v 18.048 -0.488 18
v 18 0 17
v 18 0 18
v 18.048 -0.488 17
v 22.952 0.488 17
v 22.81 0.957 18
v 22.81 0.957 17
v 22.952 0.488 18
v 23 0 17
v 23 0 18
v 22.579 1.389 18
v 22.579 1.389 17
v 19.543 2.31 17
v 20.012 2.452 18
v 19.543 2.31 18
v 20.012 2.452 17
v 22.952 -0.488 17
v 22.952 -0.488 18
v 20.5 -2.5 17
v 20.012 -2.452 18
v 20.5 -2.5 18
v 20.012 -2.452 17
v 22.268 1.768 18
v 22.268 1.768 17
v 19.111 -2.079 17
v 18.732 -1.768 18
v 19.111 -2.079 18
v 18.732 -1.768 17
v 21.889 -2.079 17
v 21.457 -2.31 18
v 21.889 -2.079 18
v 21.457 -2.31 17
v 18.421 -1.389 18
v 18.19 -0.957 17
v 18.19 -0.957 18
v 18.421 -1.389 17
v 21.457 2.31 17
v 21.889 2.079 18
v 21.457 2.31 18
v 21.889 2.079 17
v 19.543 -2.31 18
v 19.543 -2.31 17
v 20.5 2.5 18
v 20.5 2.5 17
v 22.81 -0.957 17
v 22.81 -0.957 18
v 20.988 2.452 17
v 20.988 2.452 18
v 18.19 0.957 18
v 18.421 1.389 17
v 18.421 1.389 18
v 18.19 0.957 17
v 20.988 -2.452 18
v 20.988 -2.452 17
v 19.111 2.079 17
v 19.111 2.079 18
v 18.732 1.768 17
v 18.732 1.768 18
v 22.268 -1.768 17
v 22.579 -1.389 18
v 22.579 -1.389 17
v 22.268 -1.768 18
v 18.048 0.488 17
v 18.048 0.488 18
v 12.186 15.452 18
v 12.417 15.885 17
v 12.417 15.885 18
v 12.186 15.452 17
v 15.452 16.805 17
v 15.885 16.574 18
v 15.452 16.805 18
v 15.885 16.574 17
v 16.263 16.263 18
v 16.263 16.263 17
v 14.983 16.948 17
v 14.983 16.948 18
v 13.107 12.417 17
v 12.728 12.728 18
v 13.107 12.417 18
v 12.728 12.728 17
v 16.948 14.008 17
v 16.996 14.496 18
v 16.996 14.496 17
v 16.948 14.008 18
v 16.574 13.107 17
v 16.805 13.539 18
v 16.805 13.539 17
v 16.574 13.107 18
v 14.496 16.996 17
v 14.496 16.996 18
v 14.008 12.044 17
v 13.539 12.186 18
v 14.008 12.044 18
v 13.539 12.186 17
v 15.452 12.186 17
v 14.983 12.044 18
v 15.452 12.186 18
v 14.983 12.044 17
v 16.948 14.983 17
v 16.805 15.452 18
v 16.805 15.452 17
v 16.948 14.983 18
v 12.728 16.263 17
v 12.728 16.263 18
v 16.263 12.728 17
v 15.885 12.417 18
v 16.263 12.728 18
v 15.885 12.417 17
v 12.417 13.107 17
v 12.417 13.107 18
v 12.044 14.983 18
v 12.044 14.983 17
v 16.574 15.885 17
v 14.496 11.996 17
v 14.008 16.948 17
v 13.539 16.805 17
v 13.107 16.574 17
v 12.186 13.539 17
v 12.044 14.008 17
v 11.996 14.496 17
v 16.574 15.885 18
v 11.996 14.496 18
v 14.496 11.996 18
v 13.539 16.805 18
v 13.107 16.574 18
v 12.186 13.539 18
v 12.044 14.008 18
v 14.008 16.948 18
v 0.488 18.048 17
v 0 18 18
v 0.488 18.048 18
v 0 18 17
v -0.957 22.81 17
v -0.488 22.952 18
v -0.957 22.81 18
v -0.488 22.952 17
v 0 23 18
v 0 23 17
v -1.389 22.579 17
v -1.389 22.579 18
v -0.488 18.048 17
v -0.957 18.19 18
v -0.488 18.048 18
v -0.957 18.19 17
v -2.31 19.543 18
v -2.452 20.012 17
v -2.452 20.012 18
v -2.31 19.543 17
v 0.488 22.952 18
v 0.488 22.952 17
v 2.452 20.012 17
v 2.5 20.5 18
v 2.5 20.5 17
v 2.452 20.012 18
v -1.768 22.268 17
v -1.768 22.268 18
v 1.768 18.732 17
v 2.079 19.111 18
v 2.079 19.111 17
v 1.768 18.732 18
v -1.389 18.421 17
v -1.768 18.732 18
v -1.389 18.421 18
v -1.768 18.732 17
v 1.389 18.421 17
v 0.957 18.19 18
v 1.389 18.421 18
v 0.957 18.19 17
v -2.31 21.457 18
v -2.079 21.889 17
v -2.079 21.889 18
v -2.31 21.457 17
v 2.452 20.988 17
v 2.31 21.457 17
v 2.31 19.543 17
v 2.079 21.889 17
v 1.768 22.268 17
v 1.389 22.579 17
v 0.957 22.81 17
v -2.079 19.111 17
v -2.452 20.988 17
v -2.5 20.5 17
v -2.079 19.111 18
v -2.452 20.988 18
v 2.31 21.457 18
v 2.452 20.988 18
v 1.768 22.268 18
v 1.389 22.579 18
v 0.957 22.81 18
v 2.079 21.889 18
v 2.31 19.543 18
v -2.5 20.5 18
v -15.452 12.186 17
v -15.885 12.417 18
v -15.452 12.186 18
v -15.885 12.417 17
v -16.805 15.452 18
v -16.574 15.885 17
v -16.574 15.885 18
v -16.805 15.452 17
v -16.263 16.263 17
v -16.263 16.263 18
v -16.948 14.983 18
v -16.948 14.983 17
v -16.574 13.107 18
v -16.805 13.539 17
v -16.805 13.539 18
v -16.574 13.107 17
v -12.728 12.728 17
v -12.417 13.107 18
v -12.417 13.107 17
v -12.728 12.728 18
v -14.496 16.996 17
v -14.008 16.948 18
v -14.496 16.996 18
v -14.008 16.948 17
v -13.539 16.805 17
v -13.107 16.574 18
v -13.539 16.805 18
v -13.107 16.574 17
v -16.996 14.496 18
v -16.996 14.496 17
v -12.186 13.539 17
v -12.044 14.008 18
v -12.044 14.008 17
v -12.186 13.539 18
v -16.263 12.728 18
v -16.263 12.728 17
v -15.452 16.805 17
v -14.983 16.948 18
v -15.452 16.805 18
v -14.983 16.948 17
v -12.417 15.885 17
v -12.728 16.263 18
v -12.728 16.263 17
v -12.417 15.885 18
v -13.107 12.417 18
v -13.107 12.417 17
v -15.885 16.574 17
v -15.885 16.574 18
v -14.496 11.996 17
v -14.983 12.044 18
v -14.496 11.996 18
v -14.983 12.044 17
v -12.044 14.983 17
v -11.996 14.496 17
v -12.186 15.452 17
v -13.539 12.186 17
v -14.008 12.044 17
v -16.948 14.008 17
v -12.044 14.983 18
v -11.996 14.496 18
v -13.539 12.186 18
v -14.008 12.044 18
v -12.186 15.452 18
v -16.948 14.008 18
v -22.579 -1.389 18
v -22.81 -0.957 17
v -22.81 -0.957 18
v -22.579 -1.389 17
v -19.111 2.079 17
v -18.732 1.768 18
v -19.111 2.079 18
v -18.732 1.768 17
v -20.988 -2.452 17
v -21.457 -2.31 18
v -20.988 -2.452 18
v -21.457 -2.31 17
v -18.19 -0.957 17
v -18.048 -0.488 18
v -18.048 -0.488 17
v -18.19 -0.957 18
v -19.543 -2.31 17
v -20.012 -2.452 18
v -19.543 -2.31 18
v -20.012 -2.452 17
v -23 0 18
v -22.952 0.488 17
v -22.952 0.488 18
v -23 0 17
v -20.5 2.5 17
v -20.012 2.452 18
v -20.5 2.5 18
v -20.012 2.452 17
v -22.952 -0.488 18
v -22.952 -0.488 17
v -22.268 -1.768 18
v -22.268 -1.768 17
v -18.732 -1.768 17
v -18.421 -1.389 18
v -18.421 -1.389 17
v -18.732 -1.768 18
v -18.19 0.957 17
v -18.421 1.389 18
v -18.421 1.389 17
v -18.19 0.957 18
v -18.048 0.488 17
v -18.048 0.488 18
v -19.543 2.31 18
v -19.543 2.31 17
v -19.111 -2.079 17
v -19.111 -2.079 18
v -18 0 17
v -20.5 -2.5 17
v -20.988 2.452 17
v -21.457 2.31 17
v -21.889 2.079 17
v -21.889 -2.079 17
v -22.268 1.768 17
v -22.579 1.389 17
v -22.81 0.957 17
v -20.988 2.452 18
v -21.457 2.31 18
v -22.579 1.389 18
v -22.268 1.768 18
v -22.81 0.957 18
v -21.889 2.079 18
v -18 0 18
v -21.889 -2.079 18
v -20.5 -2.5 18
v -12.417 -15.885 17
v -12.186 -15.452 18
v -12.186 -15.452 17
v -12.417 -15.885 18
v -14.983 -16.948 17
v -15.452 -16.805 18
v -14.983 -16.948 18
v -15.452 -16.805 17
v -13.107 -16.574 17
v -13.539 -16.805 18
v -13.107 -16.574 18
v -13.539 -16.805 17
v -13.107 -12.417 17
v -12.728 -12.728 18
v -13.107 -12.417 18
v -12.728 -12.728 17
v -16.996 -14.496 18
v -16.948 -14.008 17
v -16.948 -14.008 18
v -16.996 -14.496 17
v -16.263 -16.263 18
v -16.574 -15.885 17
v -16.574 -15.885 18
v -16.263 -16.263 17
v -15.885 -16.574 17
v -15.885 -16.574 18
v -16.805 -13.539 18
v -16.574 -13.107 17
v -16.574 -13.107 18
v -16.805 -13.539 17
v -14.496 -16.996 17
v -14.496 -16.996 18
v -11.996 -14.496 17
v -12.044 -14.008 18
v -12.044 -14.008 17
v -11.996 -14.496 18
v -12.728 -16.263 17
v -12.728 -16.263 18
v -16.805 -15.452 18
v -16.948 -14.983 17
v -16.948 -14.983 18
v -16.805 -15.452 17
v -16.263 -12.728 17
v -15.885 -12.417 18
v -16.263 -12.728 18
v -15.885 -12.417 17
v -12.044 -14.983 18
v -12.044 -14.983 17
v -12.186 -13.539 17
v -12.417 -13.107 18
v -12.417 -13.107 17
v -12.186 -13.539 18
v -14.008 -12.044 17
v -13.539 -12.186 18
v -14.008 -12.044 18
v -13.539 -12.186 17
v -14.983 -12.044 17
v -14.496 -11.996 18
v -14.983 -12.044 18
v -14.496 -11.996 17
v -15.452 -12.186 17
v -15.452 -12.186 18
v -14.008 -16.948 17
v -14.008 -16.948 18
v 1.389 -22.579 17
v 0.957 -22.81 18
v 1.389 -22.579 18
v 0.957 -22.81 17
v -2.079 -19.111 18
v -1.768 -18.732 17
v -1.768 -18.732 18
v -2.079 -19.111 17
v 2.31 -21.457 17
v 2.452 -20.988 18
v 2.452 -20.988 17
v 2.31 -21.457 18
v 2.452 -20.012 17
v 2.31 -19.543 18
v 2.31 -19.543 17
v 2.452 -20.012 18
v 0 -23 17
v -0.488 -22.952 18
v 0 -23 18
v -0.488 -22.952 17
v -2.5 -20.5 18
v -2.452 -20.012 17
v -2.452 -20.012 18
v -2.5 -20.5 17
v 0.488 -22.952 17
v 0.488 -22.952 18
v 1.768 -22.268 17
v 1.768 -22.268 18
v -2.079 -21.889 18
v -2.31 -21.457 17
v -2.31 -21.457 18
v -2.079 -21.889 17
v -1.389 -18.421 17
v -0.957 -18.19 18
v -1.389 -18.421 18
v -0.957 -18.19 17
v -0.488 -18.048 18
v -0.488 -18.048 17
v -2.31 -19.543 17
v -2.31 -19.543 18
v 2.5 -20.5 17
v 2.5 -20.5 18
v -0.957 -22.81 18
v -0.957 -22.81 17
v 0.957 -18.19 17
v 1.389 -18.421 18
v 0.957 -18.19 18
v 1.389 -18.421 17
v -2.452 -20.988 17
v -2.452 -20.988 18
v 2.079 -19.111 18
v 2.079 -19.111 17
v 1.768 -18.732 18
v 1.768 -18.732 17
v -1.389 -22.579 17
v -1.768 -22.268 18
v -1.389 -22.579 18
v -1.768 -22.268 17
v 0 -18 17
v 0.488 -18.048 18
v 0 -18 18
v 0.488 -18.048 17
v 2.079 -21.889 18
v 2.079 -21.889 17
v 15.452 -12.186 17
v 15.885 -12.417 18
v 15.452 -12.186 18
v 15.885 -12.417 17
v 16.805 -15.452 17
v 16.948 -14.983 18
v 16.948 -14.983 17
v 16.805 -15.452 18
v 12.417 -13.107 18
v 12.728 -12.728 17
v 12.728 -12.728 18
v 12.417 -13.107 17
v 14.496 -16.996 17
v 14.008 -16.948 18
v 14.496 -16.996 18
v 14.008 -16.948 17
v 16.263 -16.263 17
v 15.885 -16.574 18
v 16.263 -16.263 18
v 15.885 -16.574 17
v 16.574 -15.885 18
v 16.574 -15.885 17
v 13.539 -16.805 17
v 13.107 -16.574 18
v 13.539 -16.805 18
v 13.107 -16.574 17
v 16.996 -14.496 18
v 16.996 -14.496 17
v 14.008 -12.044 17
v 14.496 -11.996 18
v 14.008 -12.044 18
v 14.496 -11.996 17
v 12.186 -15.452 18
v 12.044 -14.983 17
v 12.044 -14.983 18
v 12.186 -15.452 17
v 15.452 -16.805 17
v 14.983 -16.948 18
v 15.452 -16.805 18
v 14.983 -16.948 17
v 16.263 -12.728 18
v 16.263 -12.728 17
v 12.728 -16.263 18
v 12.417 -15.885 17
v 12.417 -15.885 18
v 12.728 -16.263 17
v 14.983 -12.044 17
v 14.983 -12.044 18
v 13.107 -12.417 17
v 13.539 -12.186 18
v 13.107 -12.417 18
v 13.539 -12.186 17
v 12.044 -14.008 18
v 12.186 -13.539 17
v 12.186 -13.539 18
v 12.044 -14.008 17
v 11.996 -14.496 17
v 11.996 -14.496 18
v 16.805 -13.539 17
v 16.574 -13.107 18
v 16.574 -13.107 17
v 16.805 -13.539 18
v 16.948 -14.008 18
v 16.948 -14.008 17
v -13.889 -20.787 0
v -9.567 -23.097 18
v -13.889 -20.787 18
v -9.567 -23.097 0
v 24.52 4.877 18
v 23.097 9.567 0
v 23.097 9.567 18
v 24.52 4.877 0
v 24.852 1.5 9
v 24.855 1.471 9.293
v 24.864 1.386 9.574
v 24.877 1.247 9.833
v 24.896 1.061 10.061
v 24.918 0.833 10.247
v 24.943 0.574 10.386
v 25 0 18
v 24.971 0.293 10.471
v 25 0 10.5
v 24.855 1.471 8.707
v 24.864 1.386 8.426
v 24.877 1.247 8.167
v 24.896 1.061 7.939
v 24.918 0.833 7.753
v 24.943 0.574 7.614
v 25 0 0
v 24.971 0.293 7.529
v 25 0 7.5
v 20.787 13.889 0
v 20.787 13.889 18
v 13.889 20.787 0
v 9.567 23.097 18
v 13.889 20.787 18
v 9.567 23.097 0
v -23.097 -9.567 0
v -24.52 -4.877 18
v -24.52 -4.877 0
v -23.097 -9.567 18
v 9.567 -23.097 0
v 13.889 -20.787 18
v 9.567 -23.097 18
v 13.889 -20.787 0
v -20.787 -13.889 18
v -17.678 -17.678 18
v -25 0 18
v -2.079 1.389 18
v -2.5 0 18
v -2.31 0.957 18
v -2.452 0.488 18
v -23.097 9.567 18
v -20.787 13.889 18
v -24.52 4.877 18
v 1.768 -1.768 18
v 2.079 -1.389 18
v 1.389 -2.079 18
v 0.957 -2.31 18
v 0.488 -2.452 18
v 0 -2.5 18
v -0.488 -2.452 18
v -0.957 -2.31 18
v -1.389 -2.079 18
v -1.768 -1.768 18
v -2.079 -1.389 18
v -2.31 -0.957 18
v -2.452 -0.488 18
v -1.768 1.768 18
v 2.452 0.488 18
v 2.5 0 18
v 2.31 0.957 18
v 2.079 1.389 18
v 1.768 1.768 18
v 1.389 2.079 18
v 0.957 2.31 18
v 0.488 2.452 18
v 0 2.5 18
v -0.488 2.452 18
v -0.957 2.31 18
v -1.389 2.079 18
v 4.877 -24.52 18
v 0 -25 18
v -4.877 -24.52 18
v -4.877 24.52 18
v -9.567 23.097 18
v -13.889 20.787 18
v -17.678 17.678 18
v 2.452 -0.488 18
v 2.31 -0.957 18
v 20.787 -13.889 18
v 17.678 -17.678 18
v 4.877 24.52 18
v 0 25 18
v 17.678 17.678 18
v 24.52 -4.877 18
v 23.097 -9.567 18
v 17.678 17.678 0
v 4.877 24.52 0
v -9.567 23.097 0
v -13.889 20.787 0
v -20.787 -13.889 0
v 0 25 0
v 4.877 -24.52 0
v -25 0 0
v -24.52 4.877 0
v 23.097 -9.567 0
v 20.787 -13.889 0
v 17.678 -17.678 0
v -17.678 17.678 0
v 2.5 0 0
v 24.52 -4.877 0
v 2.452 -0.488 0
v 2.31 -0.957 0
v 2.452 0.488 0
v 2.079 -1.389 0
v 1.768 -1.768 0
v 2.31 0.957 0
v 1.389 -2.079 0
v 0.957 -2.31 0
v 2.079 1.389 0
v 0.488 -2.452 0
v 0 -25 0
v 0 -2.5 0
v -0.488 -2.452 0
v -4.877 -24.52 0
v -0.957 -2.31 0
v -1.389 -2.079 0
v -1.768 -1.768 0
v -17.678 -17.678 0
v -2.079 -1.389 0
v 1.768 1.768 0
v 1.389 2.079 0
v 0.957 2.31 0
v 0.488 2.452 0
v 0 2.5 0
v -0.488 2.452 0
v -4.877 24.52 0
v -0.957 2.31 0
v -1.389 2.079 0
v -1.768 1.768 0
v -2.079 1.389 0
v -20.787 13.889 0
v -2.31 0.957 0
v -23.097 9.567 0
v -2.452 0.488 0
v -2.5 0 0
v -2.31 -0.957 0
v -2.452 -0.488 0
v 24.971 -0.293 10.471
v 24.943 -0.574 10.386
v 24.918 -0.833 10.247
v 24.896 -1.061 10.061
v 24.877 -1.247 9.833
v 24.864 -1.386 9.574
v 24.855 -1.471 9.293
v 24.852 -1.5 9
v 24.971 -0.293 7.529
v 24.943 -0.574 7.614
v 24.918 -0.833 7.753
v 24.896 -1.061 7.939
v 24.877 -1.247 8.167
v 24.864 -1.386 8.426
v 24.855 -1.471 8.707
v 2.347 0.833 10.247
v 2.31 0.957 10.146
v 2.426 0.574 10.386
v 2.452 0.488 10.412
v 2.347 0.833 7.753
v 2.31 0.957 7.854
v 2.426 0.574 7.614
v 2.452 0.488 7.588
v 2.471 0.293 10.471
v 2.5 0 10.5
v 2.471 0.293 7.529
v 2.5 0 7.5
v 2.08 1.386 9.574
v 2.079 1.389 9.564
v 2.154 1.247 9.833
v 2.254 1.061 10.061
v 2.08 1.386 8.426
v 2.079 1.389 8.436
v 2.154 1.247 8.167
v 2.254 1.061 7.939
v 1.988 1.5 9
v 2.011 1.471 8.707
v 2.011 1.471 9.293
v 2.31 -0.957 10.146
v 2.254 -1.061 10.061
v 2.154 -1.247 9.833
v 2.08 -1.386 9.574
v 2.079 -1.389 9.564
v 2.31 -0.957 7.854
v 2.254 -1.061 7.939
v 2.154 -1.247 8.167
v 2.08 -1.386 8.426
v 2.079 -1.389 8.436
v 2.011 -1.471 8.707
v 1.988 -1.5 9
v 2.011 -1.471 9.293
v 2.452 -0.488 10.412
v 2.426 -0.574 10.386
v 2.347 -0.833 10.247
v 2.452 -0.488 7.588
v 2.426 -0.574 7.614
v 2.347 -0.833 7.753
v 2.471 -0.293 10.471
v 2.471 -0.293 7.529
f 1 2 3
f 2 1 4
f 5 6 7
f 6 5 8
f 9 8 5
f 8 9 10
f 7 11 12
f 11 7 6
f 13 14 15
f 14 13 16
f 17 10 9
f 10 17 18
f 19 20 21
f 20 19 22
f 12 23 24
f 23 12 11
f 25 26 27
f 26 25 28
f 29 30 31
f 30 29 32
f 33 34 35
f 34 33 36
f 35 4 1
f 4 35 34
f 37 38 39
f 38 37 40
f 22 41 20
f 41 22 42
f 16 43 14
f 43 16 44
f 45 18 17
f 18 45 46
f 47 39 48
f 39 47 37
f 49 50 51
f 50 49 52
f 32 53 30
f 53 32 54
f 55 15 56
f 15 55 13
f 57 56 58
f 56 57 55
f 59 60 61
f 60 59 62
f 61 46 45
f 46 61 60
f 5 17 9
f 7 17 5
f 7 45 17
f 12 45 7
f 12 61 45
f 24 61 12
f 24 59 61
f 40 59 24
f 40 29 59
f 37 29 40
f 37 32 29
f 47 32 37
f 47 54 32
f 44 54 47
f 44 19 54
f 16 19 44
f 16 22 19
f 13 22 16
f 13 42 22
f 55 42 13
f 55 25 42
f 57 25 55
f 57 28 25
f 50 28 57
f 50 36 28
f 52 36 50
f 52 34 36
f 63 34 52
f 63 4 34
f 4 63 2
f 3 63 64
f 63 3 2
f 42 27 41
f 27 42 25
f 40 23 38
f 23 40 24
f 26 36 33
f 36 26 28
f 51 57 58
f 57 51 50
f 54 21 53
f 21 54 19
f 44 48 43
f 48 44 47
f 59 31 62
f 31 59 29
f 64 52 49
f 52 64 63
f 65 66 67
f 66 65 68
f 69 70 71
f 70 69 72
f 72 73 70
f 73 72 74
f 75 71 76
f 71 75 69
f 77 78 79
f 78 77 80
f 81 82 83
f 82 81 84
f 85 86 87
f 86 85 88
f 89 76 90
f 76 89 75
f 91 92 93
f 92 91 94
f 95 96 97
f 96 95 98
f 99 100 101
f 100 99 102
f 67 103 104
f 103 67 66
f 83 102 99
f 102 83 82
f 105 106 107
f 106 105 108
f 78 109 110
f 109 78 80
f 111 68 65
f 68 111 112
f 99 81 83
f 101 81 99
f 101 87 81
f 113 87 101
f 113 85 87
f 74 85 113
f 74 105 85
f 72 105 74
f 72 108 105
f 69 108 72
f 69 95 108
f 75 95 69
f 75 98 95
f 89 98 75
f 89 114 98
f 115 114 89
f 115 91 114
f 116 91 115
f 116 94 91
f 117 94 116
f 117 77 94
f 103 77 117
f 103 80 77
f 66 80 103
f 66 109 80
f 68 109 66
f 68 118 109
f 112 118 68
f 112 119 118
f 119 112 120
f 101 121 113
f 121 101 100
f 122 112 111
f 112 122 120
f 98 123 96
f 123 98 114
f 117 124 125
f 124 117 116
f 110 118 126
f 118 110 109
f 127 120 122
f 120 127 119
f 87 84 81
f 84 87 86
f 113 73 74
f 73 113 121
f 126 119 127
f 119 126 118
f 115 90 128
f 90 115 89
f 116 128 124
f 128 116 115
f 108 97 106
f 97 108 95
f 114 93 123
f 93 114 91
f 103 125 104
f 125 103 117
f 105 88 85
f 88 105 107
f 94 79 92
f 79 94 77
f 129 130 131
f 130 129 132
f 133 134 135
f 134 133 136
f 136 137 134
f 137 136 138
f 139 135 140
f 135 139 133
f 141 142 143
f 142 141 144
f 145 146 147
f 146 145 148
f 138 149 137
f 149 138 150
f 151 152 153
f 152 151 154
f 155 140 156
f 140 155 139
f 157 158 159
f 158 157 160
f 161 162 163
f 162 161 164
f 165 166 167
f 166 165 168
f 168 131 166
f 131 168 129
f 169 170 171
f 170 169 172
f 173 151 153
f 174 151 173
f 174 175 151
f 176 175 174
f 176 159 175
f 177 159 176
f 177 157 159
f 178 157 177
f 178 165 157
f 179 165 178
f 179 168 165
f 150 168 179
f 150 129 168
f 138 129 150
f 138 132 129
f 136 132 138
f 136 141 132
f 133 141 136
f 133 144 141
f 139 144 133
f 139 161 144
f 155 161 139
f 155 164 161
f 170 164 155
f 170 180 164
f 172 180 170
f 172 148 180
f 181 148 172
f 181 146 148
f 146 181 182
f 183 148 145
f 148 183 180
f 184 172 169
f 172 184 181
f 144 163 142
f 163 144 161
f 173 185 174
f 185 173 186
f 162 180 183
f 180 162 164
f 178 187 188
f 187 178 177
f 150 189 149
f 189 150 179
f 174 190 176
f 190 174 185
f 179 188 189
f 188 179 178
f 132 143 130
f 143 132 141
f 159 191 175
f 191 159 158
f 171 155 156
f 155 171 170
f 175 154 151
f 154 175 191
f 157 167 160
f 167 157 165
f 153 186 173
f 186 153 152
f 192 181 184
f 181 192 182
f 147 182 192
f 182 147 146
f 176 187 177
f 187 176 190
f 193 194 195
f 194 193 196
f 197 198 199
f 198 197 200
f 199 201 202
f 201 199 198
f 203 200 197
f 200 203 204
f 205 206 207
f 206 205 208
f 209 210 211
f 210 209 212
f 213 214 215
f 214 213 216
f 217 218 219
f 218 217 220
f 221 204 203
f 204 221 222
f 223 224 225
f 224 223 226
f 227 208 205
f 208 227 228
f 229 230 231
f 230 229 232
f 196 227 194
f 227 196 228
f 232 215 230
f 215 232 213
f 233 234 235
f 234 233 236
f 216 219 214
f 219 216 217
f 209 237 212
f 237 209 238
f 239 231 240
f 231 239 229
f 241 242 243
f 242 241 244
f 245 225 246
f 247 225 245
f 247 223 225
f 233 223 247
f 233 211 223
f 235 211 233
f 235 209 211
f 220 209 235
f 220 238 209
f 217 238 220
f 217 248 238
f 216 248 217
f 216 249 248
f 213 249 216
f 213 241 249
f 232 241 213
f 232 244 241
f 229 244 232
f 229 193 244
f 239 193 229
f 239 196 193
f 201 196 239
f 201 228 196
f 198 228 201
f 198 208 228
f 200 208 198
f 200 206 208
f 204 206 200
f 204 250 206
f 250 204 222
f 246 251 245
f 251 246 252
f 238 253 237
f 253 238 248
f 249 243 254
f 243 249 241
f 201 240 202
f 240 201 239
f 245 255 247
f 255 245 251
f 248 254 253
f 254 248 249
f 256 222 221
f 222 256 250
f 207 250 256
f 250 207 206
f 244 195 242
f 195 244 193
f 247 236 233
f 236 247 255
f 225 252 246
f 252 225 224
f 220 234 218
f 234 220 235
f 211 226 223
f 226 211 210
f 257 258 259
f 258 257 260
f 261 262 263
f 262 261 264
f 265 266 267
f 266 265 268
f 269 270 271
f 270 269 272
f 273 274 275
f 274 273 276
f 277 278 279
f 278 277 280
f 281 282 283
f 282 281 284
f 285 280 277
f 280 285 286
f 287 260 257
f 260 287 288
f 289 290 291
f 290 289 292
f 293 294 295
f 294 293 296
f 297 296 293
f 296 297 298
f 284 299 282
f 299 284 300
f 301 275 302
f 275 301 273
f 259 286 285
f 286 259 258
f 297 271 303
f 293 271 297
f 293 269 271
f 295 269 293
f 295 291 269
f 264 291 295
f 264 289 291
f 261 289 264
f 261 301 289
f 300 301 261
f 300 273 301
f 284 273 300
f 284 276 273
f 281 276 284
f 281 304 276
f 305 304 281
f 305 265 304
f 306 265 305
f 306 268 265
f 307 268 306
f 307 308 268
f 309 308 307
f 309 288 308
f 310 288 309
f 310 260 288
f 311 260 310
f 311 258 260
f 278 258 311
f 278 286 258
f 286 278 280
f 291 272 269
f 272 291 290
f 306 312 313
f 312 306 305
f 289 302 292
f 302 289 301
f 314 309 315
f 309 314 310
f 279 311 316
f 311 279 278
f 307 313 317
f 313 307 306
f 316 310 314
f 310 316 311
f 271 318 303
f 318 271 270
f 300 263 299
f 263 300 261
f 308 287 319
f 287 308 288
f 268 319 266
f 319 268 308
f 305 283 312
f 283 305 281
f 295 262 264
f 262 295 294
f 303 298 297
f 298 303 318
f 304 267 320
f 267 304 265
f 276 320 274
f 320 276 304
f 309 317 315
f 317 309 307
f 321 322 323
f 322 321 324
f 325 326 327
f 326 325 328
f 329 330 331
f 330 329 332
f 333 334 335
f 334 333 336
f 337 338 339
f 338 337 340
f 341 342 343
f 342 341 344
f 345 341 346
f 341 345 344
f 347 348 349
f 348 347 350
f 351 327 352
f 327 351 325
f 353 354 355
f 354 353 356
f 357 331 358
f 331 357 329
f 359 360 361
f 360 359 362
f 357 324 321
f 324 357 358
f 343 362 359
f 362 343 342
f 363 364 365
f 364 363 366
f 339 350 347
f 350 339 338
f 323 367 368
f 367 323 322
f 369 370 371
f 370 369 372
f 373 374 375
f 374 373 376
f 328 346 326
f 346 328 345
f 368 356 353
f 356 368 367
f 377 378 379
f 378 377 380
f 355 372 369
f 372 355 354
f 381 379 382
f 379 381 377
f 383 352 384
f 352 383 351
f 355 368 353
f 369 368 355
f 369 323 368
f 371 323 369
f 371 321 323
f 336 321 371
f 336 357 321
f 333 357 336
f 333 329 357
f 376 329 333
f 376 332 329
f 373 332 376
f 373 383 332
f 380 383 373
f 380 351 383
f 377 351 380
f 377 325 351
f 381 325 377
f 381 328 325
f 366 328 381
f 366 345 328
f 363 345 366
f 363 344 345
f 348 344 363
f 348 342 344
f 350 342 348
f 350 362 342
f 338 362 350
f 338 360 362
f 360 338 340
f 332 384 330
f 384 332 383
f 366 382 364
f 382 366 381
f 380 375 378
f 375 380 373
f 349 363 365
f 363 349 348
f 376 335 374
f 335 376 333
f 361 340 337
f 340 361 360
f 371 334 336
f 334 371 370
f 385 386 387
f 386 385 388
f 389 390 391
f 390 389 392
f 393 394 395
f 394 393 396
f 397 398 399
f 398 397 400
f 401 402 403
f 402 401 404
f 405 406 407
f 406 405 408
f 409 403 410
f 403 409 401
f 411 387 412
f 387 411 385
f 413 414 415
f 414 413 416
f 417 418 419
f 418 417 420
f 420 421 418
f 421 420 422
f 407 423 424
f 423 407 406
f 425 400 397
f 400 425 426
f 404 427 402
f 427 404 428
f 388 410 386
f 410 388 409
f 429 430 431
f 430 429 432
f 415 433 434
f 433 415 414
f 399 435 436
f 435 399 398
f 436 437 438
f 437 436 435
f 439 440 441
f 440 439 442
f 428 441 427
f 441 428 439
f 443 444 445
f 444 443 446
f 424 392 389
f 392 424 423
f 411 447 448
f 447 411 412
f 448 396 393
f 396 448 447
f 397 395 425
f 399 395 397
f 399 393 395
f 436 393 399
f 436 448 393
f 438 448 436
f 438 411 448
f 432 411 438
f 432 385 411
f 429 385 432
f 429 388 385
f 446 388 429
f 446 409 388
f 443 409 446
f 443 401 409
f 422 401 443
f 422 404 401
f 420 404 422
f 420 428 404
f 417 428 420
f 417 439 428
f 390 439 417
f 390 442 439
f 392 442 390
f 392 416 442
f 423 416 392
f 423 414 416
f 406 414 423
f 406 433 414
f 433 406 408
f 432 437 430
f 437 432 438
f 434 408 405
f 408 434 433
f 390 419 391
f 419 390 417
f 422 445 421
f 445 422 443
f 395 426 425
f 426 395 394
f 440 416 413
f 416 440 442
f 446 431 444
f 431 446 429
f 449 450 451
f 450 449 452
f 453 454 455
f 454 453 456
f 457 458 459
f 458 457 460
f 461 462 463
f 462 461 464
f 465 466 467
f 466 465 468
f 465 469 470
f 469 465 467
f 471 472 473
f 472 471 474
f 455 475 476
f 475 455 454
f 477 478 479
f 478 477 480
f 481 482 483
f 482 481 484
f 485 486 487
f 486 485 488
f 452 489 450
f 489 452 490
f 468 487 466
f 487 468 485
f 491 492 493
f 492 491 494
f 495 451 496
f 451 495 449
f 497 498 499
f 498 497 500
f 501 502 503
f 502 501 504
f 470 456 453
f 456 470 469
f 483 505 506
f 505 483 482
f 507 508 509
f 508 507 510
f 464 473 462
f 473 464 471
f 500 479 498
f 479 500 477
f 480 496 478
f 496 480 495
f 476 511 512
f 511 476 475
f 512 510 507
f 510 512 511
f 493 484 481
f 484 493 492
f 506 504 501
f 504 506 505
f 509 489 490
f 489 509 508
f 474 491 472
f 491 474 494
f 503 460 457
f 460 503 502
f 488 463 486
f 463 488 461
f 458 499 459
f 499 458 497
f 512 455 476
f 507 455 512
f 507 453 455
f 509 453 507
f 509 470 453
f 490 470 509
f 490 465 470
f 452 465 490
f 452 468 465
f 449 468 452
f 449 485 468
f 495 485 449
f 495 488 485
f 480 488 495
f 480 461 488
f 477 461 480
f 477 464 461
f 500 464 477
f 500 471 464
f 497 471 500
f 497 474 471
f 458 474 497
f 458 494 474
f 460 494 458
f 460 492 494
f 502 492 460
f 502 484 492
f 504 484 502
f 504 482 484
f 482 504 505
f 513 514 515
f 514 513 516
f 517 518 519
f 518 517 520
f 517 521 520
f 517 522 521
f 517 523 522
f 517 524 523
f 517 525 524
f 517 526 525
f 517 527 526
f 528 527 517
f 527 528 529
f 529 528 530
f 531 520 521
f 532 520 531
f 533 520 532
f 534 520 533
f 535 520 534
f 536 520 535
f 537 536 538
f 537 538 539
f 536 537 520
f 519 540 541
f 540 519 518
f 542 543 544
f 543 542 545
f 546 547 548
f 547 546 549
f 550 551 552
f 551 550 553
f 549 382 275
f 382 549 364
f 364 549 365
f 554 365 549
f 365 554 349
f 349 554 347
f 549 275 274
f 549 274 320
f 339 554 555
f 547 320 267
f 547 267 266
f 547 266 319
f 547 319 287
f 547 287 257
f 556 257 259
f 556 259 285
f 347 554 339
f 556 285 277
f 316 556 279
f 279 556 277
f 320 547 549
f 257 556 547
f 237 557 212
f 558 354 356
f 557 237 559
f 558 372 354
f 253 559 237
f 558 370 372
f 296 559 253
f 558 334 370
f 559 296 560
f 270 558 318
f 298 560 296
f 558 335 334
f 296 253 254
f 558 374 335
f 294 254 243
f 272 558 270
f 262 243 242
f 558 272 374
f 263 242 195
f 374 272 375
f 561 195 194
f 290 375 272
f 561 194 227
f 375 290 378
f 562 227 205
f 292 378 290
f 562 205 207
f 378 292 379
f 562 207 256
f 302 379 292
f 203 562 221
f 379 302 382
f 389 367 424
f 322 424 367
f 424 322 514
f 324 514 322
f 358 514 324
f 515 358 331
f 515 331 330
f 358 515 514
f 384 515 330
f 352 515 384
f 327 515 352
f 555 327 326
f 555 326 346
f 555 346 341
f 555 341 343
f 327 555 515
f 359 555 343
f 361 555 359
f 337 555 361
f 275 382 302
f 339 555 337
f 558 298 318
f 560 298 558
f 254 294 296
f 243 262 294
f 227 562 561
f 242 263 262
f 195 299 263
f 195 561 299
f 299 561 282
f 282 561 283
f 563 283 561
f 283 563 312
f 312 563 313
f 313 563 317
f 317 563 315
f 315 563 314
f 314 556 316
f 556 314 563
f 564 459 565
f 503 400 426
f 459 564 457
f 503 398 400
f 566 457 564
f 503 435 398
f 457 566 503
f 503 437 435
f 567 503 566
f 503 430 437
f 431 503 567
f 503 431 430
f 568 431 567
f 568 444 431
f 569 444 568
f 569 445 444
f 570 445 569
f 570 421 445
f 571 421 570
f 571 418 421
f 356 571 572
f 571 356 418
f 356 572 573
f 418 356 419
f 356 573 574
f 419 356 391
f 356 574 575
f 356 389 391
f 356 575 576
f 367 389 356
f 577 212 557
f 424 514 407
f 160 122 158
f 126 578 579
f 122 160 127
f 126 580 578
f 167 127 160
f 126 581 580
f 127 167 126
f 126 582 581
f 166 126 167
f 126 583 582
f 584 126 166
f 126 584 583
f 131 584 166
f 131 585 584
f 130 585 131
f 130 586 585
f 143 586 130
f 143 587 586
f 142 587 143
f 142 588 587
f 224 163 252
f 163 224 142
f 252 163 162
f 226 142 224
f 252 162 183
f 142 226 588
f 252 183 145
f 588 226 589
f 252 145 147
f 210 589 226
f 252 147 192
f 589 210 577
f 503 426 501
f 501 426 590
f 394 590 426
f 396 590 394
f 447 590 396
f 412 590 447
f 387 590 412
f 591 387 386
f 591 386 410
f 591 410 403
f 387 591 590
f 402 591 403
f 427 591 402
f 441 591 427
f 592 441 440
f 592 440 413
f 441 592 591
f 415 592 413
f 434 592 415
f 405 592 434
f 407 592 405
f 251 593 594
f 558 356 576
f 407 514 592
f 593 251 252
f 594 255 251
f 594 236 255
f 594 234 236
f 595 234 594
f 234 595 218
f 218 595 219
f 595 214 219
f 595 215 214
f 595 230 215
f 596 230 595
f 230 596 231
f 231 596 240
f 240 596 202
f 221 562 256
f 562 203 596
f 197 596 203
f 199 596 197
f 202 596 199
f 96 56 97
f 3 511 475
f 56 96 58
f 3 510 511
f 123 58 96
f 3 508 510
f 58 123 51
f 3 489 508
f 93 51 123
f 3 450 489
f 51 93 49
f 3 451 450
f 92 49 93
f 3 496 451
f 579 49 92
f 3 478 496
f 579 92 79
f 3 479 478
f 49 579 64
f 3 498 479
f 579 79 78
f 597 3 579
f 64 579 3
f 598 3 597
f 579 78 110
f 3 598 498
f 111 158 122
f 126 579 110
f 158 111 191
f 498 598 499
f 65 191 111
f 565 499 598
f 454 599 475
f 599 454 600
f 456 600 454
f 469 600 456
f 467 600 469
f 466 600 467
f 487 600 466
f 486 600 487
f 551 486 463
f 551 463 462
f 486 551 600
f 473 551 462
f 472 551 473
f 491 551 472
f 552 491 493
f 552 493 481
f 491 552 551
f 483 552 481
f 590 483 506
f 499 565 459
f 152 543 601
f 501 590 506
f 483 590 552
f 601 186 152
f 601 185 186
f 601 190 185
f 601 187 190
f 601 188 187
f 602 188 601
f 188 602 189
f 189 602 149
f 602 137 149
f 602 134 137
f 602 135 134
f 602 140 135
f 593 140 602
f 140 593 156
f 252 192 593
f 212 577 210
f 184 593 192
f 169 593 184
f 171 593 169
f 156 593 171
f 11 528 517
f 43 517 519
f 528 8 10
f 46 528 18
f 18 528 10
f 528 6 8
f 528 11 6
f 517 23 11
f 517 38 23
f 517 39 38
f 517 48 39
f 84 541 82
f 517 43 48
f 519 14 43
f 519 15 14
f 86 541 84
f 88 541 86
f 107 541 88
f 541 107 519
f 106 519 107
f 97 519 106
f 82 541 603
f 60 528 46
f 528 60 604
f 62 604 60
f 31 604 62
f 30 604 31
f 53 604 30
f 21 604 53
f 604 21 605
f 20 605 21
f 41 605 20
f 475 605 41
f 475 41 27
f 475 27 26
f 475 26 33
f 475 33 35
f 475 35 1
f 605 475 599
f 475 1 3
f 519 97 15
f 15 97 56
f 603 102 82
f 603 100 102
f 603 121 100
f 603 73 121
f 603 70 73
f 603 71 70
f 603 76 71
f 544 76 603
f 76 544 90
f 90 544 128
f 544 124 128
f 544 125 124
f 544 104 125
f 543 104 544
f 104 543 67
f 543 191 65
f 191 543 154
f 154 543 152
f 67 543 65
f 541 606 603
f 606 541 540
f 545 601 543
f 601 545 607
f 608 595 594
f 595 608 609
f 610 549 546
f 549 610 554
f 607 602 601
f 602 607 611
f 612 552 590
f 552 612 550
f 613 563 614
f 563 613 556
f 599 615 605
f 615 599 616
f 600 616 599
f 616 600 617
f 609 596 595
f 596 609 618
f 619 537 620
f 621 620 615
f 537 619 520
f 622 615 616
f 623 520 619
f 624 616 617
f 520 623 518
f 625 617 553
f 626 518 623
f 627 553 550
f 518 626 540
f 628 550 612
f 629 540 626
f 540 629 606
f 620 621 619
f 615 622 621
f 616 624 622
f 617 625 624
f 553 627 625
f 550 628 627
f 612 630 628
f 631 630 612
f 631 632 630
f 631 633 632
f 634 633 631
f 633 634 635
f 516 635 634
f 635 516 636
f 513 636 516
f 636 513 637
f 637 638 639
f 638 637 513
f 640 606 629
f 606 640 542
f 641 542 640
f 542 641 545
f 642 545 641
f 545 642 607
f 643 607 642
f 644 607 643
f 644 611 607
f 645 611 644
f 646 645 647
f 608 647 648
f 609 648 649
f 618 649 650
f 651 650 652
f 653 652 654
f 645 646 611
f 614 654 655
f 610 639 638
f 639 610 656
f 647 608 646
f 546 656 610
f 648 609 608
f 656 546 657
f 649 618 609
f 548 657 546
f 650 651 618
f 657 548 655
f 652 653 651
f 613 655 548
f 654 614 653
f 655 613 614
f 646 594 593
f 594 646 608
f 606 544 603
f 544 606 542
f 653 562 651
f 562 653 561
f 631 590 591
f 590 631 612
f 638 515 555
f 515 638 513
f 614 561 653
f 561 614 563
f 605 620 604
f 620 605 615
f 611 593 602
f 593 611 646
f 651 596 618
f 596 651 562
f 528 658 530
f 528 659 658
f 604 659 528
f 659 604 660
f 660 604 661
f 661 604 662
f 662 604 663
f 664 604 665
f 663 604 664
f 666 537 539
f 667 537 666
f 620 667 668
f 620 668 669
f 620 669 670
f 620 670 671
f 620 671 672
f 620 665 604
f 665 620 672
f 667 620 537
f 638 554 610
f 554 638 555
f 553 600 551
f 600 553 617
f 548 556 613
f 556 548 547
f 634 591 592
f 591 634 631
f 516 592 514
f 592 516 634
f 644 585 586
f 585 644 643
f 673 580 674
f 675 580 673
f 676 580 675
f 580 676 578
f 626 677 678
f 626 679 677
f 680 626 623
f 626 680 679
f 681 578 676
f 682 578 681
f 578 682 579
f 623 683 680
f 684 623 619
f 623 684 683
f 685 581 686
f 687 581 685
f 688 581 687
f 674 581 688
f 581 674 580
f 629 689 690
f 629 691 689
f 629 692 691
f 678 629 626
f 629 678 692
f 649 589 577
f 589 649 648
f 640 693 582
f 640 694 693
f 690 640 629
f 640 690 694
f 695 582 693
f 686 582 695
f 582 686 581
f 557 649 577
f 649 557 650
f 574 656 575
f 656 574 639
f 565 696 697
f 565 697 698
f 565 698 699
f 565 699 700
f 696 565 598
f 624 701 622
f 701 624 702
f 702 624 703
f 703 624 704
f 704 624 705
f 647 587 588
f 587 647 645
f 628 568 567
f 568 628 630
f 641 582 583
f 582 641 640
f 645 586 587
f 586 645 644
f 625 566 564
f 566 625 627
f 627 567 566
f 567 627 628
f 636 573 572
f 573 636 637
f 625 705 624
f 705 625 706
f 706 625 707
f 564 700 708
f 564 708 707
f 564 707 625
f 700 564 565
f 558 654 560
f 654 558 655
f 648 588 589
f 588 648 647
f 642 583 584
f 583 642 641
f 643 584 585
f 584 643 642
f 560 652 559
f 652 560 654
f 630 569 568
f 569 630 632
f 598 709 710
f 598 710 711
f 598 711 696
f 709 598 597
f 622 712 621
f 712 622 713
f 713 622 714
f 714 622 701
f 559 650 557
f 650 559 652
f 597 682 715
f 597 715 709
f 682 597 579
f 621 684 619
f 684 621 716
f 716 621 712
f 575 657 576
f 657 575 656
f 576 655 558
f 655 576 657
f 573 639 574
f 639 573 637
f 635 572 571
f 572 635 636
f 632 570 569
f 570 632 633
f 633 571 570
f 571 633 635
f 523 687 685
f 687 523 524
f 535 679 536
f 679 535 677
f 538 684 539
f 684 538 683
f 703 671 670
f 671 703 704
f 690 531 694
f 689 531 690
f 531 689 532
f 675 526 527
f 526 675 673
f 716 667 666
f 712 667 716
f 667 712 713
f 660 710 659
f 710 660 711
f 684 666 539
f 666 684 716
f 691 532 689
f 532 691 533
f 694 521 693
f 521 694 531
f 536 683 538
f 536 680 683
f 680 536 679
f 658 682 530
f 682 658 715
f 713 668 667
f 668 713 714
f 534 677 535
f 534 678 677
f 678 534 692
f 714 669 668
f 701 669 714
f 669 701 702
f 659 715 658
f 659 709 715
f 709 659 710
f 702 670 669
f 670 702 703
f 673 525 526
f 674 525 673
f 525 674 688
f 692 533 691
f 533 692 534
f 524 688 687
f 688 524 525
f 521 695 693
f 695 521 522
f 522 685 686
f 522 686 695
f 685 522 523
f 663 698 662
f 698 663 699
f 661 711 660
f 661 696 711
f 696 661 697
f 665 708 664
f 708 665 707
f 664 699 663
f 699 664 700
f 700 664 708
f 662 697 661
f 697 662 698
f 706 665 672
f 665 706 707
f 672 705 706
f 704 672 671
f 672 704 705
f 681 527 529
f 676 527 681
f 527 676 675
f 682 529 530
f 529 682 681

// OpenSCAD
$fn = 32;

// ----------------------------------------------------------------------
// Control knob: dimpled knob
// ----------------------------------------------------------------------

// --- parameters (mm) ---
dimp_d = 5;               // finger dimple diameter
n_dimp = 8;               // number of dimples
dimp_r = 20.5;            // dimple ring radius
knob_d = 50;              // knob body diameter
knob_h = 18;              // knob body height
bore_d = 5;               // shaft bore diameter
set_d = 3;                // set screw bore diameter

dimp_step = 360 / n_dimp;  // dimple angular step

difference() {
  cylinder(h = knob_h, d = knob_d);
  translate([0, 0, -1]) cylinder(h = knob_h + 2, d = bore_d);
  translate([-1, 0, knob_h / 2]) rotate([0, 90, 0])
    cylinder(h = knob_d / 2 + bore_d / 2 + 2, d = set_d);  for (i = [0 : n_dimp - 1])
    rotate([0, 0, i * dimp_step])
      translate([dimp_r, 0, knob_h - 1])
        cylinder(h = 2, d = dimp_d);
}
